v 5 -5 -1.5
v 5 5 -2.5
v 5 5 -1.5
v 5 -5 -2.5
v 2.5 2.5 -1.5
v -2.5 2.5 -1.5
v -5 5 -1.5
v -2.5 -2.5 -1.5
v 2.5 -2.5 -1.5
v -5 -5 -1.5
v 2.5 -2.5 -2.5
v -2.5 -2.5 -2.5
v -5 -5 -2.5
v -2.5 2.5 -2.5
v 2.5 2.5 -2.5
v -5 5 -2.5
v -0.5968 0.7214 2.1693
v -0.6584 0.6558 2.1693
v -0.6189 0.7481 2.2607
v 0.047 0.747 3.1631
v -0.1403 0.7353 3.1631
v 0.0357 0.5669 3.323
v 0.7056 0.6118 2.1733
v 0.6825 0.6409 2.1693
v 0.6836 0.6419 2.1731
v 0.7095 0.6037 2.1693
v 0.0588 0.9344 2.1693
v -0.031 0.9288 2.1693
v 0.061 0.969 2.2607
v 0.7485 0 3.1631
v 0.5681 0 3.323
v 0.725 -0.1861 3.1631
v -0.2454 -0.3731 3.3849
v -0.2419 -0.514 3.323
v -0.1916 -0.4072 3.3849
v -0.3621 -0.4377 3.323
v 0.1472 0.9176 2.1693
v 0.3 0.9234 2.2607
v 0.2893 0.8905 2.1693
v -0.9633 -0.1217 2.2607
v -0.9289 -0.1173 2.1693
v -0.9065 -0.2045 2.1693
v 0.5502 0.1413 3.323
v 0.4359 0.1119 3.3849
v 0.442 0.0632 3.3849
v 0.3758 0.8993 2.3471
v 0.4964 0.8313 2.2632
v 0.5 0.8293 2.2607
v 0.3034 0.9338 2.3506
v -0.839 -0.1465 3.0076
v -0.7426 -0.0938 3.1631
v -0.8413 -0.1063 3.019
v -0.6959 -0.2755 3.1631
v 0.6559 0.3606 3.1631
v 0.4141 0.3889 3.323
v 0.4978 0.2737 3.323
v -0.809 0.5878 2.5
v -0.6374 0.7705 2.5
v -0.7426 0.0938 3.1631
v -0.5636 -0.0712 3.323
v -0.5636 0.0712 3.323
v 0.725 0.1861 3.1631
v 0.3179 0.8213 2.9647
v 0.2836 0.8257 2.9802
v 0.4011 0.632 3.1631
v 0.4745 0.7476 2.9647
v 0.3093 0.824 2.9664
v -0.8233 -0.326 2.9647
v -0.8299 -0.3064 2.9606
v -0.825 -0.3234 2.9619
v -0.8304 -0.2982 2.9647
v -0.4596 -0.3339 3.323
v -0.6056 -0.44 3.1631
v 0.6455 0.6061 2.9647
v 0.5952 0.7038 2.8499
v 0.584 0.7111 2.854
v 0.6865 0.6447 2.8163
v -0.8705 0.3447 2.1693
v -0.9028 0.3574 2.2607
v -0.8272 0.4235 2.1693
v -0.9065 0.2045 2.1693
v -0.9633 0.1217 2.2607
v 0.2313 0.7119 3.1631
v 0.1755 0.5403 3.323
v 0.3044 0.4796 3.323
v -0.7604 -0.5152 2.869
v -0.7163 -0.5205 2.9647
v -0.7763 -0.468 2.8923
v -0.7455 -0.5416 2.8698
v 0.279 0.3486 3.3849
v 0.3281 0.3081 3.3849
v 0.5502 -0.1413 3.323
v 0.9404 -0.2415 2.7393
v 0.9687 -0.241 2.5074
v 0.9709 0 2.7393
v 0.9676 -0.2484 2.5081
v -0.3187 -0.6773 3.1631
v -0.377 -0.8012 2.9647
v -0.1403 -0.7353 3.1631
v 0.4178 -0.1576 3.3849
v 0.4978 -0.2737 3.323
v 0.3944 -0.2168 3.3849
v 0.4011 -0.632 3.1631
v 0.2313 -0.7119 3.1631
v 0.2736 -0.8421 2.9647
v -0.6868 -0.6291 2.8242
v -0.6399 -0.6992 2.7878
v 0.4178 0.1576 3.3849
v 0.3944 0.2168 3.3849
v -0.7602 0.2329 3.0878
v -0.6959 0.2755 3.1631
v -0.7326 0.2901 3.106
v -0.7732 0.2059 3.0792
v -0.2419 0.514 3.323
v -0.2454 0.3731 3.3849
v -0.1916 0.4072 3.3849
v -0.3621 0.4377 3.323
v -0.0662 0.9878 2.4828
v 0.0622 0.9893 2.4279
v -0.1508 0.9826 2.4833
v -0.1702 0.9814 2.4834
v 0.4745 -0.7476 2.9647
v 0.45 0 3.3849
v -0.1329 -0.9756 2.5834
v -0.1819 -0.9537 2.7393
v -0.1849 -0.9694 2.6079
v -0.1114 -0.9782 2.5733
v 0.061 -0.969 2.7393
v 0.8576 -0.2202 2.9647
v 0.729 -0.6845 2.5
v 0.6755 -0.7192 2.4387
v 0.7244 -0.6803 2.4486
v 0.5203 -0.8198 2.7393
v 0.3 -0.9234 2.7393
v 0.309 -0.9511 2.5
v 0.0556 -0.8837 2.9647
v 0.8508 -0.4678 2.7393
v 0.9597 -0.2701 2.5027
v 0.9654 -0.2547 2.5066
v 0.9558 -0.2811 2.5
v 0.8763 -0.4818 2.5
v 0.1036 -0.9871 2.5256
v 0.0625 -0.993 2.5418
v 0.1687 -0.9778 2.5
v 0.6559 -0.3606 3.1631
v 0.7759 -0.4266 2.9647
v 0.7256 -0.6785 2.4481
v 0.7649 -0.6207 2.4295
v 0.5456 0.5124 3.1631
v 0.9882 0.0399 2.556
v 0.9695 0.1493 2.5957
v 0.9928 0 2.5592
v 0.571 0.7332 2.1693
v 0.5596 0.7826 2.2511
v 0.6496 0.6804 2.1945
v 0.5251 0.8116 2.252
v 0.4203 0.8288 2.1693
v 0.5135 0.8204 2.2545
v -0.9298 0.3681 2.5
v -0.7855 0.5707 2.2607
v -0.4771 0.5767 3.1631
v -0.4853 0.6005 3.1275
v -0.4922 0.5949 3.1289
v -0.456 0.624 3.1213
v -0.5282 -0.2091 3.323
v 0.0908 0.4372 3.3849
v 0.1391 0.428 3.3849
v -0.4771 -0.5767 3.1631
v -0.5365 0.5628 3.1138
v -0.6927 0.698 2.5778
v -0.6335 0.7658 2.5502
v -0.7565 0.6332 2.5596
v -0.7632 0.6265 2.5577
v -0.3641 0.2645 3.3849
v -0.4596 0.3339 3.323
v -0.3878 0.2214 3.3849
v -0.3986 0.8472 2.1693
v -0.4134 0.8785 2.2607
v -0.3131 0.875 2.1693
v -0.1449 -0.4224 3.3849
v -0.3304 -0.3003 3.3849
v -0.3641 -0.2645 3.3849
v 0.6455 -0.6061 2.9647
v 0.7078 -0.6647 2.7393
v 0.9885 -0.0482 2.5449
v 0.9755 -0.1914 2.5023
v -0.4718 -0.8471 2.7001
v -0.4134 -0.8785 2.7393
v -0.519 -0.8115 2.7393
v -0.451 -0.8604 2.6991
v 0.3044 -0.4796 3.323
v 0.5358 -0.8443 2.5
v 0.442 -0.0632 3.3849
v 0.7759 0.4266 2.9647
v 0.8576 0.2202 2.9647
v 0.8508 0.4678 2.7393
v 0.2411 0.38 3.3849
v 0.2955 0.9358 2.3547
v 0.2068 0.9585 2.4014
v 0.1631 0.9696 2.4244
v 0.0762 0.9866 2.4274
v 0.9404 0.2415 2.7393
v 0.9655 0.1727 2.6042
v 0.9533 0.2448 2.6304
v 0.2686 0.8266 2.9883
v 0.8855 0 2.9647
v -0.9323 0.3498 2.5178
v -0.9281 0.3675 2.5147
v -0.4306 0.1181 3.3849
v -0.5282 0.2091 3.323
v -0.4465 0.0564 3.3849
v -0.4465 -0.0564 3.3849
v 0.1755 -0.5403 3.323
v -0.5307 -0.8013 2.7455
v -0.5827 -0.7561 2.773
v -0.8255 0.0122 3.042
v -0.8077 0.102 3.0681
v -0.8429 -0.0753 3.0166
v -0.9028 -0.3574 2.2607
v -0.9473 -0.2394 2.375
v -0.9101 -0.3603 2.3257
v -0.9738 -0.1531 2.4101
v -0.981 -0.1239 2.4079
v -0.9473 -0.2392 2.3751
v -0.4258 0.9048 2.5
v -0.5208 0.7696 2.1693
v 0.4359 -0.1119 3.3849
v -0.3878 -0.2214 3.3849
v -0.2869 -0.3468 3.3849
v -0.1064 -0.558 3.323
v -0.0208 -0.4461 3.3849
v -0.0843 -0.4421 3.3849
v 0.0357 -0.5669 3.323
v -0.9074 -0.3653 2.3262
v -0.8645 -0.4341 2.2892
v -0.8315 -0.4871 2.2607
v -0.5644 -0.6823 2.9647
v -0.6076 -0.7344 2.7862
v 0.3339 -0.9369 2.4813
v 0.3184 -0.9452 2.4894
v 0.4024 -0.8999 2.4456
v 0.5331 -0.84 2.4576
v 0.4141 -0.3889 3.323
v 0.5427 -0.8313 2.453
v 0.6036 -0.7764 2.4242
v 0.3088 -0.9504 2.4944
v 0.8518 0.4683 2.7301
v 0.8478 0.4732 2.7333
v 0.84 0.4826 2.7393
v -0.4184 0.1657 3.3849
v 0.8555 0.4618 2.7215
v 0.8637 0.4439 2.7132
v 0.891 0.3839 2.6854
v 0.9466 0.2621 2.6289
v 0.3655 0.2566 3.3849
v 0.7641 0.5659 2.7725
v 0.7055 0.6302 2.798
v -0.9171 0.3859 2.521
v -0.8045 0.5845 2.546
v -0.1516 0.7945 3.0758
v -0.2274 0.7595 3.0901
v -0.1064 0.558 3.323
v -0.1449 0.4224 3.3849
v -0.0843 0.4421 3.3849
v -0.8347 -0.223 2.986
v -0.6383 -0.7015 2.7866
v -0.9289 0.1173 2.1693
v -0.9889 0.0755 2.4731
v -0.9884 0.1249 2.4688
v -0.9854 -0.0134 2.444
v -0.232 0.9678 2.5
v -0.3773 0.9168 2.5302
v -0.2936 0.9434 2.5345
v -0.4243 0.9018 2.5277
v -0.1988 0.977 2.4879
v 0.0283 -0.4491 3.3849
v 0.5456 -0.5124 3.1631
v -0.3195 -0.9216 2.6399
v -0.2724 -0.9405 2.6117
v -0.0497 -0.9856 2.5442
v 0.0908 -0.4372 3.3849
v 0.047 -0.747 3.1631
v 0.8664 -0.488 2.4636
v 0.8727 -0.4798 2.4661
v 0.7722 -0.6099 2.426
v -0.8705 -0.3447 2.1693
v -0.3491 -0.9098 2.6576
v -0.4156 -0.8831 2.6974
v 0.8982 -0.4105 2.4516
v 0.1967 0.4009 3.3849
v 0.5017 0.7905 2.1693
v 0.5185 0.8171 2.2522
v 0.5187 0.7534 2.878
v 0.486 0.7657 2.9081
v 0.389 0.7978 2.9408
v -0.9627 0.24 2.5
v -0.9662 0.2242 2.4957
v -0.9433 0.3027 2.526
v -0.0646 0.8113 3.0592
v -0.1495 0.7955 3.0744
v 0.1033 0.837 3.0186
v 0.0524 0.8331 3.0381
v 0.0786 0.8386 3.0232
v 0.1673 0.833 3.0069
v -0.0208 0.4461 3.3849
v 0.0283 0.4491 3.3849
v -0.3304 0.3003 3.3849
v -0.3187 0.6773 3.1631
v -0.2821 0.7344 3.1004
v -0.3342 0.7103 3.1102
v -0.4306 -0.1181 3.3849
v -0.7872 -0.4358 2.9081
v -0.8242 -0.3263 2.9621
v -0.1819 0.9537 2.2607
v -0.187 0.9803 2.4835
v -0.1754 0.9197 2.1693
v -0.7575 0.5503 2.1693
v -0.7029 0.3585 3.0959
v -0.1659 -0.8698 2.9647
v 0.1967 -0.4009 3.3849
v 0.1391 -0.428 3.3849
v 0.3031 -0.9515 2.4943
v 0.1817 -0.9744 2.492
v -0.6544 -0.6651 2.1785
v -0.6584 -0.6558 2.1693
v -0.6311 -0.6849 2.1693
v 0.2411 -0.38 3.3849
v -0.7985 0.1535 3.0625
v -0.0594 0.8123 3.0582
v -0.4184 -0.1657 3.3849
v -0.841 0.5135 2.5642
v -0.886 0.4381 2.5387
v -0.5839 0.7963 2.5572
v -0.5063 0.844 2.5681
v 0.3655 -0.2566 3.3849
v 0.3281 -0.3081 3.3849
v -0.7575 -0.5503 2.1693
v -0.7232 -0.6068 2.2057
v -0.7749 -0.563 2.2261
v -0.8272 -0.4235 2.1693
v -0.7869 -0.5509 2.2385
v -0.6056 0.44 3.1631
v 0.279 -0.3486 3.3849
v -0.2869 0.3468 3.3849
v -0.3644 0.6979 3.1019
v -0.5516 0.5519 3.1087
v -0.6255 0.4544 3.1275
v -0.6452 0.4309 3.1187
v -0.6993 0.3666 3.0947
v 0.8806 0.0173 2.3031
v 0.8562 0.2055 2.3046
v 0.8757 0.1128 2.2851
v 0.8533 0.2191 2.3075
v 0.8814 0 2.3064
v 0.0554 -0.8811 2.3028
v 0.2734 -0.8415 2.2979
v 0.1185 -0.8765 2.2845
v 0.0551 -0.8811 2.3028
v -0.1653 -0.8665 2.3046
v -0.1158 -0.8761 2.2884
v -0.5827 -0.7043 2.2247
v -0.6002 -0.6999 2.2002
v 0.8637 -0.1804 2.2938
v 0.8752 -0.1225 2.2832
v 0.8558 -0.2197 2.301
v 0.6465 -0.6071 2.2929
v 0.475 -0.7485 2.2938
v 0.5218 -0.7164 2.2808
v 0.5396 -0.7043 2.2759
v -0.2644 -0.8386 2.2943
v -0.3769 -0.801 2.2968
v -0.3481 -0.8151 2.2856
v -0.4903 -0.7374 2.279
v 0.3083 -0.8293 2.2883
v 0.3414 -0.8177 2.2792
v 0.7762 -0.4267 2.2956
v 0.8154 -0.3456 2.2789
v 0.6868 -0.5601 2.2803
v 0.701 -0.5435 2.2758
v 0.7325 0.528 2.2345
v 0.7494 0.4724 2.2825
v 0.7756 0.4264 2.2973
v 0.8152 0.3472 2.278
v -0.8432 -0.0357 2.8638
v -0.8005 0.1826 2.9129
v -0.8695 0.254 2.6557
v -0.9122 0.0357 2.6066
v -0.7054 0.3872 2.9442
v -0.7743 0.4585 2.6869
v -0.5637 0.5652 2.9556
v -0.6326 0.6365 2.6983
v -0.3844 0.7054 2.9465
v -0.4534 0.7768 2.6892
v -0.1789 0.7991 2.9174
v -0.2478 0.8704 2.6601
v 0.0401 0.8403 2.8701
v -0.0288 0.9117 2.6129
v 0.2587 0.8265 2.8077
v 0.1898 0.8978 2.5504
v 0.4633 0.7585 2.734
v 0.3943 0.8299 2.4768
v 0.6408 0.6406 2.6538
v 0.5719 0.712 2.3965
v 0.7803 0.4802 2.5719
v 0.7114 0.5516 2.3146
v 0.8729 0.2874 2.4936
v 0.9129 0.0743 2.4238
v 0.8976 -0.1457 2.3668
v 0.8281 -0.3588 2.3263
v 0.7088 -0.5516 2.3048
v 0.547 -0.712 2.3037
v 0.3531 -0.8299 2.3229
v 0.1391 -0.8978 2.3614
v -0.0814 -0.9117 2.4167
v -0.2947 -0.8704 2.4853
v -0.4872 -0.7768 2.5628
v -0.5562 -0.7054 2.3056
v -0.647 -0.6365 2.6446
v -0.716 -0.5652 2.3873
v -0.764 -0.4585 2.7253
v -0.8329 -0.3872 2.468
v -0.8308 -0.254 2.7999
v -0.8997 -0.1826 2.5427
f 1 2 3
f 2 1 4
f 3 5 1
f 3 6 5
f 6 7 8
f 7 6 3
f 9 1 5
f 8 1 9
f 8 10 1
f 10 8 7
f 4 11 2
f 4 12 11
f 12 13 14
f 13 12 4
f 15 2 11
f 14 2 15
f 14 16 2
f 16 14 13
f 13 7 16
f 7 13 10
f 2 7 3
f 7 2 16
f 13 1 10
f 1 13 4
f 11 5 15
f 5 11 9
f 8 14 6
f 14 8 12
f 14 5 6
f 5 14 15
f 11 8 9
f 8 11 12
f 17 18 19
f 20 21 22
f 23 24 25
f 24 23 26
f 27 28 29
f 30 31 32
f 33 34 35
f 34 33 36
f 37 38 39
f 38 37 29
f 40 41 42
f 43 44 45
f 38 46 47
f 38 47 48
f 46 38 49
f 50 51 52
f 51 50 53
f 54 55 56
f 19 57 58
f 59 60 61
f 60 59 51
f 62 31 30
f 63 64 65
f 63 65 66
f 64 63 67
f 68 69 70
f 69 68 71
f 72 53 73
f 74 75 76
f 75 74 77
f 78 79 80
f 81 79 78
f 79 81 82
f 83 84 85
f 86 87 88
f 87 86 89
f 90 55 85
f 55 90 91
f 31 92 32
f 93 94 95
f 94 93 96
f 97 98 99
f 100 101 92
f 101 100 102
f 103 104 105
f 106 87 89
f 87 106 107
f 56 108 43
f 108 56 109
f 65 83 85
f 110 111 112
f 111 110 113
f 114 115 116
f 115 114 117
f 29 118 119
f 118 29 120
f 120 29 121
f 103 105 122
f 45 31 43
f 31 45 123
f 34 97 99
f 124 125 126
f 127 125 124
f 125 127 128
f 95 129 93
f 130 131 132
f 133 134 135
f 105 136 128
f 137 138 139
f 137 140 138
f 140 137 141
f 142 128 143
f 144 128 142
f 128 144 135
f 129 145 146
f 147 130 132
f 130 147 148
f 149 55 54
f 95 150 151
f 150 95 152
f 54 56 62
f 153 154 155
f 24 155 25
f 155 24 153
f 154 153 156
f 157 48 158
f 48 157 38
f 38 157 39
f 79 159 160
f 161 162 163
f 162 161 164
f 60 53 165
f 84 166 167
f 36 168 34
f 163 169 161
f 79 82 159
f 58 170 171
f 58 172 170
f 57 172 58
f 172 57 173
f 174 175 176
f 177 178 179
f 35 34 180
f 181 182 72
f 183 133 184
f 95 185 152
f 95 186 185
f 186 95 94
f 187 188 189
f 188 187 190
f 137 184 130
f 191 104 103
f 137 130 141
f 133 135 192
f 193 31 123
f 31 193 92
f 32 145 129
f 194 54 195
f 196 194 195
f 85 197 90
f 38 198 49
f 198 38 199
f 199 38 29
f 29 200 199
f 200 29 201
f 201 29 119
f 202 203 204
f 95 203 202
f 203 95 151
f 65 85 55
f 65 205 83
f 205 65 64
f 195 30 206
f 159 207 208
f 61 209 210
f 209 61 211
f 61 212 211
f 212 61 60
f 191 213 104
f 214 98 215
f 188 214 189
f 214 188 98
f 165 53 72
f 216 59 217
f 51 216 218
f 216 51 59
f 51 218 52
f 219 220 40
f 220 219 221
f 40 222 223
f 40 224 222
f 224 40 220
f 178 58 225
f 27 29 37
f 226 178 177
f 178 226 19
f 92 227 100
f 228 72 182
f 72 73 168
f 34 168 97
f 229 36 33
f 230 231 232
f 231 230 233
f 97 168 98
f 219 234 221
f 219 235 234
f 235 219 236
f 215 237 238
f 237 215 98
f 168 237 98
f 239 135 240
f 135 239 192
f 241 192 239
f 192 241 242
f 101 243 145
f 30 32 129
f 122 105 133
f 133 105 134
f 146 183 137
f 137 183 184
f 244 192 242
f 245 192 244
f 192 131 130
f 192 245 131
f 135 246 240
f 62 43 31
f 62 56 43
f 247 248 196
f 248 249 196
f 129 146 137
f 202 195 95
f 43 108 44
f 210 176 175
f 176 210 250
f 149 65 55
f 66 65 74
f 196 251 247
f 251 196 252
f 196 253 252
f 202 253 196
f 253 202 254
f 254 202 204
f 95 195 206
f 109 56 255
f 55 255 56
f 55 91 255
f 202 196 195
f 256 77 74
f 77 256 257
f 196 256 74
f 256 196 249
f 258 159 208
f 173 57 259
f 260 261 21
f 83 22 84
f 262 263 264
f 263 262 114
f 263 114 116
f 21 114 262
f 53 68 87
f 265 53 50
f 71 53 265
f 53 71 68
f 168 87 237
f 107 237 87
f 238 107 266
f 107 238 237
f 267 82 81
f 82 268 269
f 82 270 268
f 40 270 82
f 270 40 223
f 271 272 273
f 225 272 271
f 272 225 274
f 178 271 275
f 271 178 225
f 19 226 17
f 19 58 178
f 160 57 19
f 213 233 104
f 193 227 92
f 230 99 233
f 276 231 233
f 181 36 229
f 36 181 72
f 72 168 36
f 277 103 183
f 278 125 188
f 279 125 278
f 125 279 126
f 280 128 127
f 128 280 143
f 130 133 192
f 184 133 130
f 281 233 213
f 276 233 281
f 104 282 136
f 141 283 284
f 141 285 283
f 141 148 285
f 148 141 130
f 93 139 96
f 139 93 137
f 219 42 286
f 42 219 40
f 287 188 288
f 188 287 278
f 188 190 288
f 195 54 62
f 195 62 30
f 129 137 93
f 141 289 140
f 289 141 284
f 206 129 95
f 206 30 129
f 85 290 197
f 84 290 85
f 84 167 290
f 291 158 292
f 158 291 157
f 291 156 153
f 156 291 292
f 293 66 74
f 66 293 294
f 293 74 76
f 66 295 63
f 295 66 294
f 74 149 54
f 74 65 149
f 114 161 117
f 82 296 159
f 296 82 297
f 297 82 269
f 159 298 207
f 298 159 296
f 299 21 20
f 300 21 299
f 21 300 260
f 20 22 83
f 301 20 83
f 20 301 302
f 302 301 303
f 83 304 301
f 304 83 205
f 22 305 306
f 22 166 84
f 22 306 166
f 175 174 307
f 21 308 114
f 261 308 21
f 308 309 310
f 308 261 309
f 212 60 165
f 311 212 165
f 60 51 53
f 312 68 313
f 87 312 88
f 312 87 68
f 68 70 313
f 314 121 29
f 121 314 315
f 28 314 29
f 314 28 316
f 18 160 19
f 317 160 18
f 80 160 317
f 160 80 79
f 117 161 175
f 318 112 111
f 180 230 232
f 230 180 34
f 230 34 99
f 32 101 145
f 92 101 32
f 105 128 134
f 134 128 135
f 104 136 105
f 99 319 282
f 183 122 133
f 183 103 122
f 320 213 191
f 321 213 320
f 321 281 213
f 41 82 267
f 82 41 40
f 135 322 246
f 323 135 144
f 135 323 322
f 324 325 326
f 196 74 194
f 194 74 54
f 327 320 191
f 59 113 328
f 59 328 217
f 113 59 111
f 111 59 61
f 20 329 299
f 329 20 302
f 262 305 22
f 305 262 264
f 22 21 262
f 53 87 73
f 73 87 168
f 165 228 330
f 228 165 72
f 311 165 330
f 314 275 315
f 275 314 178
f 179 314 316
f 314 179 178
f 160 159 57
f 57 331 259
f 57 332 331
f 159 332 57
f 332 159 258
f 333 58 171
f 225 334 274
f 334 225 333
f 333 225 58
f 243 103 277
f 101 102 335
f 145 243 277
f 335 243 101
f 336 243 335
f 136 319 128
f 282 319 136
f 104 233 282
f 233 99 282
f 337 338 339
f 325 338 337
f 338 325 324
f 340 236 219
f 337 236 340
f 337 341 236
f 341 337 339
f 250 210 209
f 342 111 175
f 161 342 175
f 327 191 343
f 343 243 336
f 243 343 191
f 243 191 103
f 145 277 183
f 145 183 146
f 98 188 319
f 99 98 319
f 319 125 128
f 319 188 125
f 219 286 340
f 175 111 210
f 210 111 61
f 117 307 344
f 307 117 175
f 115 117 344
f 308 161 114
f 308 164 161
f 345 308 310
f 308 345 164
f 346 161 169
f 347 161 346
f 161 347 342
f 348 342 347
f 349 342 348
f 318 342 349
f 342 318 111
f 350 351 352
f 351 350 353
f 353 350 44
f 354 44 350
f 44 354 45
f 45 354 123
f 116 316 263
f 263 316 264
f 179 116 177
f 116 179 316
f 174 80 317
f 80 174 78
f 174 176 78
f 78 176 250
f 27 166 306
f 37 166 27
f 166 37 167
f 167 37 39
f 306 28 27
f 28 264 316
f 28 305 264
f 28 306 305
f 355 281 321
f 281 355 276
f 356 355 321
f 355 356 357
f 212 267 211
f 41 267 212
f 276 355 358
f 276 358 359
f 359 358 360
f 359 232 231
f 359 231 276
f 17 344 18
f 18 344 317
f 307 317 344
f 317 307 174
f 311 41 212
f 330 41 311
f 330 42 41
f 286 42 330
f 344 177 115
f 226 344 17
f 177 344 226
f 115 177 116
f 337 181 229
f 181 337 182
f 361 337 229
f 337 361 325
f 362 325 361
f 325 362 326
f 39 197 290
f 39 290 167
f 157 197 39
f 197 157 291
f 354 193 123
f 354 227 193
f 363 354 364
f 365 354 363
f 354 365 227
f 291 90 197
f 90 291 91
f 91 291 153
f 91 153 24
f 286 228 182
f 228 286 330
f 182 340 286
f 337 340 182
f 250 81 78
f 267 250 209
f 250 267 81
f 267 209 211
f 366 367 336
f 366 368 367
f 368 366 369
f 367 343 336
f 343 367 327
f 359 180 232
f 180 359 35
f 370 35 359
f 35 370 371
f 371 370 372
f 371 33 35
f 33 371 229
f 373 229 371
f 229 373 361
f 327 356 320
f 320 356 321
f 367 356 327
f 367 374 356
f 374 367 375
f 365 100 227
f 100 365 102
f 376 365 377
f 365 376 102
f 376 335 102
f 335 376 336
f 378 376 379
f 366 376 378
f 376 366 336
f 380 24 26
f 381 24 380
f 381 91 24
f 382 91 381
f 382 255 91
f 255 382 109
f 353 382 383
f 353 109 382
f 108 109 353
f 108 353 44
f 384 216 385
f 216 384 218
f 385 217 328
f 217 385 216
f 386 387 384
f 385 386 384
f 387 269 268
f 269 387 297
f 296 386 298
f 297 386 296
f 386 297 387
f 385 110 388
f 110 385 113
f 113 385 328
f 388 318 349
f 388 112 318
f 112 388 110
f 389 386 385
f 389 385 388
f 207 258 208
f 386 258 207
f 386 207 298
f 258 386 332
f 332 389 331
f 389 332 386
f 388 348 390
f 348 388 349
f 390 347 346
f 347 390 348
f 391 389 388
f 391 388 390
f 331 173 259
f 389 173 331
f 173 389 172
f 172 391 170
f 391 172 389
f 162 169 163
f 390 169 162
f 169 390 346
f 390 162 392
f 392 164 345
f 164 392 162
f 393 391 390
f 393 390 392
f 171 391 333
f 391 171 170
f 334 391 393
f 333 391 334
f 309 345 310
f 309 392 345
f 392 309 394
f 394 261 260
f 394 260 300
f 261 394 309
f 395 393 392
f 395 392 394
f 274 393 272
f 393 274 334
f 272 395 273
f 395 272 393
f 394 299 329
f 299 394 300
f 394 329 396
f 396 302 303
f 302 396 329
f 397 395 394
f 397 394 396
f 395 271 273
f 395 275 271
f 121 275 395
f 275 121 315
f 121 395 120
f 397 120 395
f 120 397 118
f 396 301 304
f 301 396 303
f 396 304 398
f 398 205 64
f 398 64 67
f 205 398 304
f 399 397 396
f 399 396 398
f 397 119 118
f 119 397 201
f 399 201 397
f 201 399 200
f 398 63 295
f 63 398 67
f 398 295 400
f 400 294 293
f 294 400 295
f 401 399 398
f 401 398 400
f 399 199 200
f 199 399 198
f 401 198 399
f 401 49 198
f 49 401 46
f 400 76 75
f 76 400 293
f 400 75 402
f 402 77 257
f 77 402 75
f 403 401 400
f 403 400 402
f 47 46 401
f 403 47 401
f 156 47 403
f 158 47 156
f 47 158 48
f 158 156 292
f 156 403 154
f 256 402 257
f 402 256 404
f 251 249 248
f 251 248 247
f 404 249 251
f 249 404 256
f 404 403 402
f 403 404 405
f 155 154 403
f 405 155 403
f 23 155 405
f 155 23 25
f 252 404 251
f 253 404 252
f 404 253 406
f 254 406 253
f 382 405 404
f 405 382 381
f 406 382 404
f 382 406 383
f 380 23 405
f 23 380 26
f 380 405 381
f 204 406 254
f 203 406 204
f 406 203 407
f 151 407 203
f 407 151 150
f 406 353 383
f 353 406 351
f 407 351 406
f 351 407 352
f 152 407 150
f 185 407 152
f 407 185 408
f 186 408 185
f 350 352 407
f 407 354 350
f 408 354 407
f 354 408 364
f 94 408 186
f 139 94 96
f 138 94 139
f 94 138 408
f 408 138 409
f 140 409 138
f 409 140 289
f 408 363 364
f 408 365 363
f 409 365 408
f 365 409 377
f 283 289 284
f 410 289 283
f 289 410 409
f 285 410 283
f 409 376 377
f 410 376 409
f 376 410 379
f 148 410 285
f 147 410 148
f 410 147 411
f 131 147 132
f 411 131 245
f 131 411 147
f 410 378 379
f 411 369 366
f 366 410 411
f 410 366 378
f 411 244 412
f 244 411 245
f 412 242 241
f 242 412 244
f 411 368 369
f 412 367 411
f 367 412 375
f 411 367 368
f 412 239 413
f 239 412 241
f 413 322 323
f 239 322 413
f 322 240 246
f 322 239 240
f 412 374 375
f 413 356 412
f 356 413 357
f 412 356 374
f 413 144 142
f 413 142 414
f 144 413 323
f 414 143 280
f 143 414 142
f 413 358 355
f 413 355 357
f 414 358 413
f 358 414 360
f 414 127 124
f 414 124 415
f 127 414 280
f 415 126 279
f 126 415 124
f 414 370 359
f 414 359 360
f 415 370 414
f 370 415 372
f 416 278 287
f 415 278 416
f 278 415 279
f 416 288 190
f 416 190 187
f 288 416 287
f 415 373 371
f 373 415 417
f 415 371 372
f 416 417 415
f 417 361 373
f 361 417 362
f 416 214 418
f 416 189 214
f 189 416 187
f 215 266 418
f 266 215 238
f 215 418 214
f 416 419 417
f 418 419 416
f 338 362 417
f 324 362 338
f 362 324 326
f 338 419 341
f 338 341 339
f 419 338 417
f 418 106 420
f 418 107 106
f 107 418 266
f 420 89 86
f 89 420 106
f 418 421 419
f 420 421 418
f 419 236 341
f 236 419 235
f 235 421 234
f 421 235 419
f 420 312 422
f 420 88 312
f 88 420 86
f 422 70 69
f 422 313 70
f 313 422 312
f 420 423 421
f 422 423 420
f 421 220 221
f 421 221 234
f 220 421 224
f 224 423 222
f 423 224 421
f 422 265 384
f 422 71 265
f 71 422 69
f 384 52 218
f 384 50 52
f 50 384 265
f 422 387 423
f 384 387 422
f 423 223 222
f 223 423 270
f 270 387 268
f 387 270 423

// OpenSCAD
$fn=25;
translate([0, 0, -2.5]) {

    difference(){
        translate([-5, -5, 0]) {
            cube([10, 10, 1]);
        };

        translate([-2.5, -2.5, -0.5]) {
            color([0.8, 0.8, 0.5]) cube([5, 5, 2]);
        };
    }

    difference(){
        difference(){
            translate([0, 0, 5]) {
                sphere(d = 2);
            };

            translate([0, 0, 2.01]) {
                cylinder(d1 = 4, d2 = 0, h = 5);
            };
        }

        translate([0, 0, 5]) {
            rotate([15,15,0]){
                rotate_extrude(convexity = 10)
                translate([2, 0, 0])
                circle(r = 1.1);
            }
        }
    }
};



// minkowski(){
//     cube([10, 10, 1]);
//     cylinder(r=1, h=1);
// }

// difference() {
//     circle(10);
//     square(15);
// }
